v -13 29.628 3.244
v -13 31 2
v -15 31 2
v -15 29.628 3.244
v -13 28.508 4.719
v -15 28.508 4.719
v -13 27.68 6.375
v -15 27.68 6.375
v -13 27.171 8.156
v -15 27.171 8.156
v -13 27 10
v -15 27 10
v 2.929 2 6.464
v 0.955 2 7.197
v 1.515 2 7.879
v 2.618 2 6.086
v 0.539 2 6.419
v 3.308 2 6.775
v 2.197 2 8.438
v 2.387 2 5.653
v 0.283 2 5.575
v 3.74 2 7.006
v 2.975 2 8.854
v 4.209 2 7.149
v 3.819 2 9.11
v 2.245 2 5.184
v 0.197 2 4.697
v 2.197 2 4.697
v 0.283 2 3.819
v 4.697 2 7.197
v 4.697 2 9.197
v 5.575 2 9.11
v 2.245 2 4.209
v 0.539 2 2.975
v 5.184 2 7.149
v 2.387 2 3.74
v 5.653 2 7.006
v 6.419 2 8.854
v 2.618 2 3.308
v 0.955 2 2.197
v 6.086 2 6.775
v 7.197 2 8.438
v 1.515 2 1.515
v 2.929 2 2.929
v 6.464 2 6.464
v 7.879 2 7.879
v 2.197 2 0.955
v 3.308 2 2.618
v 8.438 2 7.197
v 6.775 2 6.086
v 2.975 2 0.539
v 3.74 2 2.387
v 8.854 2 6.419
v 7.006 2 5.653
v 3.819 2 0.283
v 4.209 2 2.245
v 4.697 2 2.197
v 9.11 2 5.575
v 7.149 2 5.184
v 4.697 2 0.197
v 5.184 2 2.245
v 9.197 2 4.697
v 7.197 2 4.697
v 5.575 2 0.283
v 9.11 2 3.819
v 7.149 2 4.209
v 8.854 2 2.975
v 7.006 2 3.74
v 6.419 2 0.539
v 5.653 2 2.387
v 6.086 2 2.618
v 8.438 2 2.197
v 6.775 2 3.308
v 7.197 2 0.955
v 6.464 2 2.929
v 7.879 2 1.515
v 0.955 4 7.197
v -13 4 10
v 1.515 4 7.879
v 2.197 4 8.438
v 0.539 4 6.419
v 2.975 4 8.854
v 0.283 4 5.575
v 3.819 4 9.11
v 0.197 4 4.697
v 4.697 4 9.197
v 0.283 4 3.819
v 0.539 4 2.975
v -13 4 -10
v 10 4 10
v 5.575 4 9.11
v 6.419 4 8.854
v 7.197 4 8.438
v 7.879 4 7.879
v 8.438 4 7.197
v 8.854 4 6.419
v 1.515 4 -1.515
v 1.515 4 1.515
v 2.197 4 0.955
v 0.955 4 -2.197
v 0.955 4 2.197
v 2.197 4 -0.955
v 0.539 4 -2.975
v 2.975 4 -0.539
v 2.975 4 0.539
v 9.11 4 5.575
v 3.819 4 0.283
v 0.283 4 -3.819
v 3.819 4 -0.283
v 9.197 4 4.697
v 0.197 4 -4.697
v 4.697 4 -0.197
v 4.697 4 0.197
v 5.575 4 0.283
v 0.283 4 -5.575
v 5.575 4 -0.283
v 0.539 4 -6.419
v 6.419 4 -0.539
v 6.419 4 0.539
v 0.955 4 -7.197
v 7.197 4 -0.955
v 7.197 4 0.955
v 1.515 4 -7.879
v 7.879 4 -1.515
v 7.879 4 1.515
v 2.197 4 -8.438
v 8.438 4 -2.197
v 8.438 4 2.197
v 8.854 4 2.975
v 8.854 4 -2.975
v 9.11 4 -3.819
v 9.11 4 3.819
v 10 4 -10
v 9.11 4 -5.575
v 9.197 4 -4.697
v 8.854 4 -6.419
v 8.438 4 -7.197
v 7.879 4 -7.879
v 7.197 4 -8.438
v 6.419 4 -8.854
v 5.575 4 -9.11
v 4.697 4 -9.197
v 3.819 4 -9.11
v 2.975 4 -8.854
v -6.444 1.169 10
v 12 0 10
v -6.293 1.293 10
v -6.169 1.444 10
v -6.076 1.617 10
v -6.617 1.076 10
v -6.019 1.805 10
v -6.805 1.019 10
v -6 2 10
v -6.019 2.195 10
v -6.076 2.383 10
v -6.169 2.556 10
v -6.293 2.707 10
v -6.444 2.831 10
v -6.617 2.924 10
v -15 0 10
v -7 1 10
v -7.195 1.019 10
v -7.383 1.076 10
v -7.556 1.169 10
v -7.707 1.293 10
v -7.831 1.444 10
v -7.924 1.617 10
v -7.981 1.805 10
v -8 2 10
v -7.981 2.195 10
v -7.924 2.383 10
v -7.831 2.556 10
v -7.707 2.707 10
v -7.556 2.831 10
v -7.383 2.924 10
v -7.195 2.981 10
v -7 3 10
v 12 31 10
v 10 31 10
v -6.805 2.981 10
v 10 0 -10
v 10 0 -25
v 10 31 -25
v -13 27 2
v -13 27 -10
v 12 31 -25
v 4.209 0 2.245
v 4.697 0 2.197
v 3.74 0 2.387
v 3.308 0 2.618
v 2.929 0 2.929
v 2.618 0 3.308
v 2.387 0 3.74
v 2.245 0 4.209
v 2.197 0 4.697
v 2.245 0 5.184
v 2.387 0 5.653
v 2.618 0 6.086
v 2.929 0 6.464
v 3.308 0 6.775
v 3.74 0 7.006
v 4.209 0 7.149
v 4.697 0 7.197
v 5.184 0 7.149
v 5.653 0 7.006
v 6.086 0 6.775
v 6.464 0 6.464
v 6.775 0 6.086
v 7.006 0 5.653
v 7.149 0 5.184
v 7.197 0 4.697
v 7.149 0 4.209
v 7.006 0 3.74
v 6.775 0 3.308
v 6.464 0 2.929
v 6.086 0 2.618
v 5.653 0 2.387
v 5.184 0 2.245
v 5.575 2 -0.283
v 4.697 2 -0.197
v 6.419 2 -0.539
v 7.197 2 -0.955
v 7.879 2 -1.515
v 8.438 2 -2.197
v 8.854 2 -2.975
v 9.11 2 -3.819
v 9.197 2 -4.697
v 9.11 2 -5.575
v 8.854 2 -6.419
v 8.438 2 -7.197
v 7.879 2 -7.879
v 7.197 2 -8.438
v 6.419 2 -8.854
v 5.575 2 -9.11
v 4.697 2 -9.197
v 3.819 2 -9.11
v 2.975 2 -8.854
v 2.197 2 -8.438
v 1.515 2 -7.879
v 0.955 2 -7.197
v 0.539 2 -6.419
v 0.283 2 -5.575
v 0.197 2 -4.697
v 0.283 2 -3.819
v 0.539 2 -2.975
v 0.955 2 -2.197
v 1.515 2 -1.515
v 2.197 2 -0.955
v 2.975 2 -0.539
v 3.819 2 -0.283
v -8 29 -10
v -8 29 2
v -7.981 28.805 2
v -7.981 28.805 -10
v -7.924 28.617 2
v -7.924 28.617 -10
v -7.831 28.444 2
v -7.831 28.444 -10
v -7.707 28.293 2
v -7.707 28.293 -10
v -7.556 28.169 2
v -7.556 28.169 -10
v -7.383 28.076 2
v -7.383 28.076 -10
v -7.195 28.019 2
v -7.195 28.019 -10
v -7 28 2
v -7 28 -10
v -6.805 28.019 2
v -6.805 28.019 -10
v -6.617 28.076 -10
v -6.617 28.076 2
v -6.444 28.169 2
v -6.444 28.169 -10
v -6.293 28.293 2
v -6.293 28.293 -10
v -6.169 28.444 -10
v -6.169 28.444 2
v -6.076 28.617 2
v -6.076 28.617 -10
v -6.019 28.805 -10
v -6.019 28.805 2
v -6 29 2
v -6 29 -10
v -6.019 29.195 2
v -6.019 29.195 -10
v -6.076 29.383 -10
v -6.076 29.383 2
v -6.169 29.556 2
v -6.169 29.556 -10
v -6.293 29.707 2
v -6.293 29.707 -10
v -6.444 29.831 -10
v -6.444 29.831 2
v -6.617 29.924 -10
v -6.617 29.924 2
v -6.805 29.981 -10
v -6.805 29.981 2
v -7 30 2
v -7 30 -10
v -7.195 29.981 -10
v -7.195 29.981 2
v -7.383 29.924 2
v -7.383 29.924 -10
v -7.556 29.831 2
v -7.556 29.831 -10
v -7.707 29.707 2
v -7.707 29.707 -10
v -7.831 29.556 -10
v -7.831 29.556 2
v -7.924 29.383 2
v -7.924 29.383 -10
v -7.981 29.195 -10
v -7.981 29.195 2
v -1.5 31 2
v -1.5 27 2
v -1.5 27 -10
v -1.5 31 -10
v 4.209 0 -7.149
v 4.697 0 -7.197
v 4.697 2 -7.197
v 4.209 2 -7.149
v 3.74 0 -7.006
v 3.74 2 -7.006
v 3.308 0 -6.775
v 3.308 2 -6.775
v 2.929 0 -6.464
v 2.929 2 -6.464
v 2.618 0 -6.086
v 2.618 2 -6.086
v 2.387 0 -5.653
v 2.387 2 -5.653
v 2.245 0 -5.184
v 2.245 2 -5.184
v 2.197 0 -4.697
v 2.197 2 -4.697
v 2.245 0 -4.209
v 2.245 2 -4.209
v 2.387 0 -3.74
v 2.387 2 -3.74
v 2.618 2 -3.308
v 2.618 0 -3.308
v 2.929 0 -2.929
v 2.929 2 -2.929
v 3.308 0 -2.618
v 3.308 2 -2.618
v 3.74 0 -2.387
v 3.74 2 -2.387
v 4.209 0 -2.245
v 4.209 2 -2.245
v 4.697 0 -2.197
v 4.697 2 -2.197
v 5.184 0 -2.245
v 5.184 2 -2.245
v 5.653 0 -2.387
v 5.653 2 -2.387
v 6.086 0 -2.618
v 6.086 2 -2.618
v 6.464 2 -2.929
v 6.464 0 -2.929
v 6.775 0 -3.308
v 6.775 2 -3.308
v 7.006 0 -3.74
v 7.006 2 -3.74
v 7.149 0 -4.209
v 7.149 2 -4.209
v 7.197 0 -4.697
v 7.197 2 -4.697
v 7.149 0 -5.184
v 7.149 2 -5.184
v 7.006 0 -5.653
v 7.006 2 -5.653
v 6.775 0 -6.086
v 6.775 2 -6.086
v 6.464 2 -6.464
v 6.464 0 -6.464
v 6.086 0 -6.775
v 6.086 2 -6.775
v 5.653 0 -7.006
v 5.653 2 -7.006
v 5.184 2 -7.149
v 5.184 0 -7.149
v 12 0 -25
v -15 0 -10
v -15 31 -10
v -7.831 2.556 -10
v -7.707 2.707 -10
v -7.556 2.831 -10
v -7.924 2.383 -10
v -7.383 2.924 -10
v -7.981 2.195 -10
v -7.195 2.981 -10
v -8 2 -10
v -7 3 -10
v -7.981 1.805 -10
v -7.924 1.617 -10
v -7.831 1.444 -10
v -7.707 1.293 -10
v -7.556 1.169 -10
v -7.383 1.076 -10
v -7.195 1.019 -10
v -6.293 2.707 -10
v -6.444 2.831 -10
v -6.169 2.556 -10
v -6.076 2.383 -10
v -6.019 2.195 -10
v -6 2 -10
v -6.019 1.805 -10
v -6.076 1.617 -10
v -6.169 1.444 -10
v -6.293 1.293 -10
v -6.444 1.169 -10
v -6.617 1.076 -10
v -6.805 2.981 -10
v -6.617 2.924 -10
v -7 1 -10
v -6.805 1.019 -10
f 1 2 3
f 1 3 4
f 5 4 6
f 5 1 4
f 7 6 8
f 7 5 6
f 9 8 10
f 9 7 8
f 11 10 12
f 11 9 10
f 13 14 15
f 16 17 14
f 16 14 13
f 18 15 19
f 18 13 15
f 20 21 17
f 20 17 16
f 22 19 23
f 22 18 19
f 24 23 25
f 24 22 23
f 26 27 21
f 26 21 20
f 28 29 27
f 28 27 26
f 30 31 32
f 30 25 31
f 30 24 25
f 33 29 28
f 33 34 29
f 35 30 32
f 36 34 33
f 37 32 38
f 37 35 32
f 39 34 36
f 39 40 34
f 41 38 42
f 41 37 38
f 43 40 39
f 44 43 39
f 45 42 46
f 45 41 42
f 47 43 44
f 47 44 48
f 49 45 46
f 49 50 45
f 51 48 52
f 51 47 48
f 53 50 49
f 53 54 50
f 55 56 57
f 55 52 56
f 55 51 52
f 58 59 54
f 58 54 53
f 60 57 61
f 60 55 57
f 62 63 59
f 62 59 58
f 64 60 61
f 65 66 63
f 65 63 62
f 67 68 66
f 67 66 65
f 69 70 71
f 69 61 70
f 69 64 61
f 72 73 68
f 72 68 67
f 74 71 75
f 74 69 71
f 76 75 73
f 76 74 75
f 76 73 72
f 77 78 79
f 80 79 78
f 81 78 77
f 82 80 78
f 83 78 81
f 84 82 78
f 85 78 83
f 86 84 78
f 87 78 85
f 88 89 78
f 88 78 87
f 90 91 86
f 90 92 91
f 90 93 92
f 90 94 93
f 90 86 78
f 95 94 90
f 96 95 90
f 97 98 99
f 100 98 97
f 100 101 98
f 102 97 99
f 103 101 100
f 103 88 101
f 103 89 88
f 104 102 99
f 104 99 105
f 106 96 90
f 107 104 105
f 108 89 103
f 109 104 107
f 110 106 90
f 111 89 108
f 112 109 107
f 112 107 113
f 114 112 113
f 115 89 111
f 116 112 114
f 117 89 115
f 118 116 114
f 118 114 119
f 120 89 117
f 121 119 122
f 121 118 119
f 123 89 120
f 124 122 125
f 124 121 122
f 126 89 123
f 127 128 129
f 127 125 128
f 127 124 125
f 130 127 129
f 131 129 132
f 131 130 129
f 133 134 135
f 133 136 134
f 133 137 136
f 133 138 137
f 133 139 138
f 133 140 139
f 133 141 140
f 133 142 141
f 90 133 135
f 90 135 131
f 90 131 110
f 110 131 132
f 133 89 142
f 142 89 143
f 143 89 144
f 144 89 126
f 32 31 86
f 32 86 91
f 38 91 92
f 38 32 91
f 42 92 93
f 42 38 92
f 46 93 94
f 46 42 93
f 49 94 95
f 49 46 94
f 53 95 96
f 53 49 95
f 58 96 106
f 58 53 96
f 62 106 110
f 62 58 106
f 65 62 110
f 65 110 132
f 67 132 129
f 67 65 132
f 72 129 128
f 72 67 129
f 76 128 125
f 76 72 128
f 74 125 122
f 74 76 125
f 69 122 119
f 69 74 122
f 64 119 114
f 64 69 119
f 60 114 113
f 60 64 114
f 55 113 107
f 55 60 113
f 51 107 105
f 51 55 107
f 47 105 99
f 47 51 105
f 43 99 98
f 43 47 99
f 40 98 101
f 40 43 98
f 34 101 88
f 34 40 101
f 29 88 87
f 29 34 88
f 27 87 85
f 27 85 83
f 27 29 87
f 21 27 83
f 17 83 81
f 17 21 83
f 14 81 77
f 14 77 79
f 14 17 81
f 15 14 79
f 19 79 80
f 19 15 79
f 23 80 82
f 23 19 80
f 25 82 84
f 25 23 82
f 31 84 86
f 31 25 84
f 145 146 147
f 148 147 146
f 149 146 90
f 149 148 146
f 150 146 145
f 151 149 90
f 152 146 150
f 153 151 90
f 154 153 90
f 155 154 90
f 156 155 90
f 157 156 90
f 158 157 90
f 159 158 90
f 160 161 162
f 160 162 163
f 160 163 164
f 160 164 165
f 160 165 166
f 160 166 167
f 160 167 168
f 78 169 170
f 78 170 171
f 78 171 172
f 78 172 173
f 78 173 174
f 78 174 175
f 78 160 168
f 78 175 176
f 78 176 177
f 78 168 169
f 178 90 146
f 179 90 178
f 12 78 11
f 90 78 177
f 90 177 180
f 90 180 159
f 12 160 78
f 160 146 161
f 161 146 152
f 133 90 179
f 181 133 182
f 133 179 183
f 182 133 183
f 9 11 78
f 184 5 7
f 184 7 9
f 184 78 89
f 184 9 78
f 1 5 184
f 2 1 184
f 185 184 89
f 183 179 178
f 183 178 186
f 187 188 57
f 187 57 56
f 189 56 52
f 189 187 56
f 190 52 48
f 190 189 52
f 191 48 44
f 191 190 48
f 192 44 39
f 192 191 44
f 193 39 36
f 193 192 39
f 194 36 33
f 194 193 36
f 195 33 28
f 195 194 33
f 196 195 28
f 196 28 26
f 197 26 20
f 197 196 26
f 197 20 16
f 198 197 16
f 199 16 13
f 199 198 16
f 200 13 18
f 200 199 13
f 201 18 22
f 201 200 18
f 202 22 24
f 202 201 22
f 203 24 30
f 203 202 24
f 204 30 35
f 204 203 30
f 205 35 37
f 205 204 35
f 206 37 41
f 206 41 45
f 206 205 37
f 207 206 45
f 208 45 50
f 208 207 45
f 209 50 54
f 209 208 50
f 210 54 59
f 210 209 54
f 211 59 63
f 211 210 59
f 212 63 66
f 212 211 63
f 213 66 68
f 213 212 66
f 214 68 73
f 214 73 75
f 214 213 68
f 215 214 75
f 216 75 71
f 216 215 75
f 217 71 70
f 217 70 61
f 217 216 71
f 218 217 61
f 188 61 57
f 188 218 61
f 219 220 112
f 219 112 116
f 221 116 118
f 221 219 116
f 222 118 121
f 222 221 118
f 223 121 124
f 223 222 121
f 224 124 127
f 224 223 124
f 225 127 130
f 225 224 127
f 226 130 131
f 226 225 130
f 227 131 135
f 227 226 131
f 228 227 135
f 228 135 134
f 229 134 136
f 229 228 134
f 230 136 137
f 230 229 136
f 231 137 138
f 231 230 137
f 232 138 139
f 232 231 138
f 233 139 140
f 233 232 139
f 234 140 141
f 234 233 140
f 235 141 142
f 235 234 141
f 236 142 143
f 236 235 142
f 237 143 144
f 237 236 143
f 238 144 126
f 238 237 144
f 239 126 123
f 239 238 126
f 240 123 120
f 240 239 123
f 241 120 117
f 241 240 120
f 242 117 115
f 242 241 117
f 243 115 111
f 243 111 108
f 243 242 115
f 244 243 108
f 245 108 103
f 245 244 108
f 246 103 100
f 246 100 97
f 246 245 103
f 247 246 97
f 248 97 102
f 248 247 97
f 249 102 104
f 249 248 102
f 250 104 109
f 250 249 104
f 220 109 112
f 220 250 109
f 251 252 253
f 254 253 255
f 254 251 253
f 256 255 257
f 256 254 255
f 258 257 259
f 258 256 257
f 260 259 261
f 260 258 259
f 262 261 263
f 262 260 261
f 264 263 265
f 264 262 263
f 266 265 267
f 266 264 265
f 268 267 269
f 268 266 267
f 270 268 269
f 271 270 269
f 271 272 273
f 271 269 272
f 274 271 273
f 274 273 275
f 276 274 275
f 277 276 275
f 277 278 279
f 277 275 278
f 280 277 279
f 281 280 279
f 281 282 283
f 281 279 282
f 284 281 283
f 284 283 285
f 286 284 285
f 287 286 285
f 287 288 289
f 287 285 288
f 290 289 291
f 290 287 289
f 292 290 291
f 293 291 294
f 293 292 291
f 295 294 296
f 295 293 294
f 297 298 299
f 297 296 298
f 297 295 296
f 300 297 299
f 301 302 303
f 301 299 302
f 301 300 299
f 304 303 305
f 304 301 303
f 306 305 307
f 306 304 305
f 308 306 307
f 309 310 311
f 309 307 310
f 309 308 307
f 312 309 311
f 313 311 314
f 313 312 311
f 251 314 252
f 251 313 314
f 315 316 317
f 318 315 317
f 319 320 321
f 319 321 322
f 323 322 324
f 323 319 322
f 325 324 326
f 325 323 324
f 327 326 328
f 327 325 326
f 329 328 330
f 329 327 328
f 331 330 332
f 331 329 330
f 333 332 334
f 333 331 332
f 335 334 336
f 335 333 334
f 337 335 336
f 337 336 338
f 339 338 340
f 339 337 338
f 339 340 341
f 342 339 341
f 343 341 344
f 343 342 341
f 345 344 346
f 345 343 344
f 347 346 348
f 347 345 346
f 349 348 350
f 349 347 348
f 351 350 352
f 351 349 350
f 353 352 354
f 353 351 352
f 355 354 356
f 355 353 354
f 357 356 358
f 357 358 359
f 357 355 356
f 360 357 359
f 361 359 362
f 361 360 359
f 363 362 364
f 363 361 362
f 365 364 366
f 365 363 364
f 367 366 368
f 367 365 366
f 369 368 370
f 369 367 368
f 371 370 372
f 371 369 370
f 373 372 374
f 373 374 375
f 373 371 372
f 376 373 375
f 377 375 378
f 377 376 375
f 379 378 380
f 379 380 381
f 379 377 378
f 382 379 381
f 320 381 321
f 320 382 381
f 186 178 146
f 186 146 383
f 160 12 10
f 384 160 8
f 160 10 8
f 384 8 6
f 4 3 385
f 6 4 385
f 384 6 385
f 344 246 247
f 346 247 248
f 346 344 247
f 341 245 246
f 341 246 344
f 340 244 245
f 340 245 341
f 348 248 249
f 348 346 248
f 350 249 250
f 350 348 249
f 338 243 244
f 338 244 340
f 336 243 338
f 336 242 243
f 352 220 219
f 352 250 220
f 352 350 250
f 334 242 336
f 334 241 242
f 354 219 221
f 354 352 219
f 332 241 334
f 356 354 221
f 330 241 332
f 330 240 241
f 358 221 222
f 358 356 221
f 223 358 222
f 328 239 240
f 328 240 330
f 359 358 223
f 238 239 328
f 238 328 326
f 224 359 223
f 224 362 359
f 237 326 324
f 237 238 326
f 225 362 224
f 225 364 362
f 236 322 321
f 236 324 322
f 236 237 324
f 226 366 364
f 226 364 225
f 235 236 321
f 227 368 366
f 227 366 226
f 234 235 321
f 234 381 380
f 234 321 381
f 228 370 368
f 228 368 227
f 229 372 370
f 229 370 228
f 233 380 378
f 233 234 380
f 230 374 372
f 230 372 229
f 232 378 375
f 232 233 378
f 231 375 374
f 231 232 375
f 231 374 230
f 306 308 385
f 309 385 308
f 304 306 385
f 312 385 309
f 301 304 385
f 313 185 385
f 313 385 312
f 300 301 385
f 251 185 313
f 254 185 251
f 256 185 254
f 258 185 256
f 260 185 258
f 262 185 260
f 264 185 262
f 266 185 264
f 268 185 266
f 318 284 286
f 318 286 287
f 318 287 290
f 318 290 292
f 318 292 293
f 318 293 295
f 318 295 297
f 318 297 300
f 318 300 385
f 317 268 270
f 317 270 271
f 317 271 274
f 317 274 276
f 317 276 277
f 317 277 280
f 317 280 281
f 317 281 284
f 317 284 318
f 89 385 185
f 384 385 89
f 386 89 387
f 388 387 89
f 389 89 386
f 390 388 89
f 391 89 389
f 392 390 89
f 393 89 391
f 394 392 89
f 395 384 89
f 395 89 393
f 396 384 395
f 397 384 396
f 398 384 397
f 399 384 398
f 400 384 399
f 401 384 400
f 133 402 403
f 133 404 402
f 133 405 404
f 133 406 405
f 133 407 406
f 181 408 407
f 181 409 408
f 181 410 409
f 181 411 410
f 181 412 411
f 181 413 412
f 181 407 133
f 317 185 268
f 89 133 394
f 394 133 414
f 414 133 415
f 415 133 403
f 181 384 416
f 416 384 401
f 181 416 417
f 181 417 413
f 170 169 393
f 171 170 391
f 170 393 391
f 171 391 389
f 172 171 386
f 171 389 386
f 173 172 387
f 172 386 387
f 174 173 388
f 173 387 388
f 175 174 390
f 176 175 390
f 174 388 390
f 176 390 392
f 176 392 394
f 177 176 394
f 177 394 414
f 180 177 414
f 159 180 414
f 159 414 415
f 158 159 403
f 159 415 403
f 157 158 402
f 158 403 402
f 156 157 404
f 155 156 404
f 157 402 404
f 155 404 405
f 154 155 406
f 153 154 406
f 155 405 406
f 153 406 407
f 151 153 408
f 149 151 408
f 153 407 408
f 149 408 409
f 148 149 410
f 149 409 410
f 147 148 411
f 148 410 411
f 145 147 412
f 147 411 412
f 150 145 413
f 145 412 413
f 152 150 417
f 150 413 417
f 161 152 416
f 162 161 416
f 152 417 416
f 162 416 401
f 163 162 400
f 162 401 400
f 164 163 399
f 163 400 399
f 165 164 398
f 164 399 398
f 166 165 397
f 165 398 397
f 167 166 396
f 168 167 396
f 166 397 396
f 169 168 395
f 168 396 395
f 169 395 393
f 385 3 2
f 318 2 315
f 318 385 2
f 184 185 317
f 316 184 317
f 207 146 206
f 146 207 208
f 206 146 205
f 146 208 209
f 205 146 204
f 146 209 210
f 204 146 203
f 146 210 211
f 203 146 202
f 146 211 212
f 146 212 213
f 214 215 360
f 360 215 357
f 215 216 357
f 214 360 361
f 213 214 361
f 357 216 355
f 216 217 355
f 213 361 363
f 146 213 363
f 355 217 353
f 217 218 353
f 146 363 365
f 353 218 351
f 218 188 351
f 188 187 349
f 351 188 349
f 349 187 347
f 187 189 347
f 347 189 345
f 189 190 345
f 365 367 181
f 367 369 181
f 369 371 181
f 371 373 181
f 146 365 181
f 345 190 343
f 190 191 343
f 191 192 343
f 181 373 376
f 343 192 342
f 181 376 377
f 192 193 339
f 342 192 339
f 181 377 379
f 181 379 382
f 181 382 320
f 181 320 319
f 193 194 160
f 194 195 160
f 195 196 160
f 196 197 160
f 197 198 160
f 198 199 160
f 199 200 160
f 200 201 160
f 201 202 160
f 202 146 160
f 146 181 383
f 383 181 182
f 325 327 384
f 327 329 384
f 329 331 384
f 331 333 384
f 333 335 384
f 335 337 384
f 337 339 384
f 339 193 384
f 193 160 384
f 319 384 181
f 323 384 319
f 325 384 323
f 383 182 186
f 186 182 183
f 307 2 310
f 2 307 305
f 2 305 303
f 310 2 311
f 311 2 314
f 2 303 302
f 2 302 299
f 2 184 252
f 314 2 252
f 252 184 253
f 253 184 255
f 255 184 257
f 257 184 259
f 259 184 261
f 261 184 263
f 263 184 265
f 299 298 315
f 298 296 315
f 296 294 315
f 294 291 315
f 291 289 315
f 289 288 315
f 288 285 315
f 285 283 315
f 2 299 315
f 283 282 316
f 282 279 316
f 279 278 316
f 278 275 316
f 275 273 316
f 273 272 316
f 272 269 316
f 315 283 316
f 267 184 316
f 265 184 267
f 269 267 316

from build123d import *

# Parameters (mm, degrees)
SKETCH1_W           = 20
SKETCH1_H           = 20
SKETCH1_R           = 2.5
BOSS_EXTRUDE1_DEPTH = 2
SKETCH2_W           = 20
SKETCH2_H           = 20
SKETCH2_R           = 4.5
BOSS_EXTRUDE2_DEPTH = 2
SKETCH6_W           = 3
SKETCH6_H           = 20
BOSS_EXTRUDE4_DEPTH = 4
SKETCH4_W           = 20
SKETCH4_H           = 27
BOSS_EXTRUDE3_DEPTH = 2
SKETCH5_R           = 1
CUT_EXTRUDE1_DEPTH  = 20
SKETCH7_W           = 13.5
SKETCH7_H           = 12
BOSS_EXTRUDE5_DEPTH = 4
FILLET3_R           = 10
SKETCH9_W           = 35
SKETCH9_H           = 31
BOSS_EXTRUDE6_DEPTH = 2


with BuildPart() as part:
    # Sketch1 → Boss-Extrude1 (new body)
    with BuildSketch(Plane(origin=(0, 0, 0), x_dir=(1, 0, 0), z_dir=(0, 1, 0))):
        Rectangle(SKETCH1_W, SKETCH1_H)
        with Locations(Location((4.696699141, -4.696699141, 0), (0, 0, 90))):
            Circle(SKETCH1_R, mode=Mode.SUBTRACT)
        with Locations(Location((4.696699141, 4.696699141, 0), (0, 0, 90))):
            Circle(SKETCH1_R, mode=Mode.SUBTRACT)
    extrude(amount=BOSS_EXTRUDE1_DEPTH)

    # Sketch2 → Boss-Extrude2 (add)
    with BuildSketch(Plane(origin=(0, 2, 0), x_dir=(1, 0, 0), z_dir=(0, 1, 0))):
        Rectangle(SKETCH2_W, SKETCH2_H)
        with Locations(Location((4.696699141, -4.696699141, 0), (0, 0, 270))):
            Circle(SKETCH2_R, mode=Mode.SUBTRACT)
        with Locations(Location((4.696699141, 4.696699141, 0), (0, 0, 270))):
            Circle(SKETCH2_R, mode=Mode.SUBTRACT)
    extrude(amount=BOSS_EXTRUDE2_DEPTH)

    # Sketch6 → Boss-Extrude4 (add)
    with BuildSketch(Plane(origin=(0, 4, 0), x_dir=(1, 0, 0), z_dir=(0, 1, 0))):
        with Locations((-11.5, 0)):
            Rectangle(SKETCH6_W, SKETCH6_H)
    extrude(amount=-BOSS_EXTRUDE4_DEPTH)

    # Sketch4 → Boss-Extrude3 (add)
    with BuildSketch(Plane.ZY.offset(13)):
        with Locations((0, 13.5)):
            Rectangle(SKETCH4_W, SKETCH4_H)
    extrude(amount=BOSS_EXTRUDE3_DEPTH)

    # Sketch5 → Cut-Extrude1 (cut)
    with BuildSketch(Plane(origin=(0, 0, -10), x_dir=(-1, 0, 0), z_dir=(0, 0, -1))):
        with Locations((7, 2)):
            Circle(SKETCH5_R)
    cut_extrude1 = extrude(amount=-CUT_EXTRUDE1_DEPTH, mode=Mode.SUBTRACT)

    # Sketch7 → Boss-Extrude5 (add)
    with BuildSketch(Plane(origin=(0, 27, 0), x_dir=(1, 0, 0), z_dir=(0, 1, 0))):
        with Locations((-8.25, 4)):
            Rectangle(SKETCH7_W, SKETCH7_H)
    extrude(amount=BOSS_EXTRUDE5_DEPTH)

    # Mirror1: Cut-Extrude1 across plane
    add(cut_extrude1.mirror(Plane.ZX.offset(15.5)), mode=Mode.SUBTRACT)

    # Fillet3
    # the kernel refuses this fillet: 10 mm, written as the material it adds along each edge
    with BuildSketch(Plane(origin=(-13, 27, 2), x_dir=(0, 0, 1), z_dir=(-1, 0, 0))) as fillet3_piece_1:
        with BuildLine():
            CenterArc((8, 10), FILLET3_R, 216.869897646, 53.130102354)
            Line((0, 4), (0, 0))
            Line((0, 0), (8, 0))
        make_face()
    extrude(amount=2)

    # Sketch9 → Boss-Extrude6 (add)
    with BuildSketch(Plane(origin=(10, 0, 0), x_dir=(0, 0, -1), z_dir=(1, 0, 0))):
        with Locations((7.5, 15.5)):
            Rectangle(SKETCH9_W, SKETCH9_H)
    extrude(amount=BOSS_EXTRUDE6_DEPTH)


solid = part.part
